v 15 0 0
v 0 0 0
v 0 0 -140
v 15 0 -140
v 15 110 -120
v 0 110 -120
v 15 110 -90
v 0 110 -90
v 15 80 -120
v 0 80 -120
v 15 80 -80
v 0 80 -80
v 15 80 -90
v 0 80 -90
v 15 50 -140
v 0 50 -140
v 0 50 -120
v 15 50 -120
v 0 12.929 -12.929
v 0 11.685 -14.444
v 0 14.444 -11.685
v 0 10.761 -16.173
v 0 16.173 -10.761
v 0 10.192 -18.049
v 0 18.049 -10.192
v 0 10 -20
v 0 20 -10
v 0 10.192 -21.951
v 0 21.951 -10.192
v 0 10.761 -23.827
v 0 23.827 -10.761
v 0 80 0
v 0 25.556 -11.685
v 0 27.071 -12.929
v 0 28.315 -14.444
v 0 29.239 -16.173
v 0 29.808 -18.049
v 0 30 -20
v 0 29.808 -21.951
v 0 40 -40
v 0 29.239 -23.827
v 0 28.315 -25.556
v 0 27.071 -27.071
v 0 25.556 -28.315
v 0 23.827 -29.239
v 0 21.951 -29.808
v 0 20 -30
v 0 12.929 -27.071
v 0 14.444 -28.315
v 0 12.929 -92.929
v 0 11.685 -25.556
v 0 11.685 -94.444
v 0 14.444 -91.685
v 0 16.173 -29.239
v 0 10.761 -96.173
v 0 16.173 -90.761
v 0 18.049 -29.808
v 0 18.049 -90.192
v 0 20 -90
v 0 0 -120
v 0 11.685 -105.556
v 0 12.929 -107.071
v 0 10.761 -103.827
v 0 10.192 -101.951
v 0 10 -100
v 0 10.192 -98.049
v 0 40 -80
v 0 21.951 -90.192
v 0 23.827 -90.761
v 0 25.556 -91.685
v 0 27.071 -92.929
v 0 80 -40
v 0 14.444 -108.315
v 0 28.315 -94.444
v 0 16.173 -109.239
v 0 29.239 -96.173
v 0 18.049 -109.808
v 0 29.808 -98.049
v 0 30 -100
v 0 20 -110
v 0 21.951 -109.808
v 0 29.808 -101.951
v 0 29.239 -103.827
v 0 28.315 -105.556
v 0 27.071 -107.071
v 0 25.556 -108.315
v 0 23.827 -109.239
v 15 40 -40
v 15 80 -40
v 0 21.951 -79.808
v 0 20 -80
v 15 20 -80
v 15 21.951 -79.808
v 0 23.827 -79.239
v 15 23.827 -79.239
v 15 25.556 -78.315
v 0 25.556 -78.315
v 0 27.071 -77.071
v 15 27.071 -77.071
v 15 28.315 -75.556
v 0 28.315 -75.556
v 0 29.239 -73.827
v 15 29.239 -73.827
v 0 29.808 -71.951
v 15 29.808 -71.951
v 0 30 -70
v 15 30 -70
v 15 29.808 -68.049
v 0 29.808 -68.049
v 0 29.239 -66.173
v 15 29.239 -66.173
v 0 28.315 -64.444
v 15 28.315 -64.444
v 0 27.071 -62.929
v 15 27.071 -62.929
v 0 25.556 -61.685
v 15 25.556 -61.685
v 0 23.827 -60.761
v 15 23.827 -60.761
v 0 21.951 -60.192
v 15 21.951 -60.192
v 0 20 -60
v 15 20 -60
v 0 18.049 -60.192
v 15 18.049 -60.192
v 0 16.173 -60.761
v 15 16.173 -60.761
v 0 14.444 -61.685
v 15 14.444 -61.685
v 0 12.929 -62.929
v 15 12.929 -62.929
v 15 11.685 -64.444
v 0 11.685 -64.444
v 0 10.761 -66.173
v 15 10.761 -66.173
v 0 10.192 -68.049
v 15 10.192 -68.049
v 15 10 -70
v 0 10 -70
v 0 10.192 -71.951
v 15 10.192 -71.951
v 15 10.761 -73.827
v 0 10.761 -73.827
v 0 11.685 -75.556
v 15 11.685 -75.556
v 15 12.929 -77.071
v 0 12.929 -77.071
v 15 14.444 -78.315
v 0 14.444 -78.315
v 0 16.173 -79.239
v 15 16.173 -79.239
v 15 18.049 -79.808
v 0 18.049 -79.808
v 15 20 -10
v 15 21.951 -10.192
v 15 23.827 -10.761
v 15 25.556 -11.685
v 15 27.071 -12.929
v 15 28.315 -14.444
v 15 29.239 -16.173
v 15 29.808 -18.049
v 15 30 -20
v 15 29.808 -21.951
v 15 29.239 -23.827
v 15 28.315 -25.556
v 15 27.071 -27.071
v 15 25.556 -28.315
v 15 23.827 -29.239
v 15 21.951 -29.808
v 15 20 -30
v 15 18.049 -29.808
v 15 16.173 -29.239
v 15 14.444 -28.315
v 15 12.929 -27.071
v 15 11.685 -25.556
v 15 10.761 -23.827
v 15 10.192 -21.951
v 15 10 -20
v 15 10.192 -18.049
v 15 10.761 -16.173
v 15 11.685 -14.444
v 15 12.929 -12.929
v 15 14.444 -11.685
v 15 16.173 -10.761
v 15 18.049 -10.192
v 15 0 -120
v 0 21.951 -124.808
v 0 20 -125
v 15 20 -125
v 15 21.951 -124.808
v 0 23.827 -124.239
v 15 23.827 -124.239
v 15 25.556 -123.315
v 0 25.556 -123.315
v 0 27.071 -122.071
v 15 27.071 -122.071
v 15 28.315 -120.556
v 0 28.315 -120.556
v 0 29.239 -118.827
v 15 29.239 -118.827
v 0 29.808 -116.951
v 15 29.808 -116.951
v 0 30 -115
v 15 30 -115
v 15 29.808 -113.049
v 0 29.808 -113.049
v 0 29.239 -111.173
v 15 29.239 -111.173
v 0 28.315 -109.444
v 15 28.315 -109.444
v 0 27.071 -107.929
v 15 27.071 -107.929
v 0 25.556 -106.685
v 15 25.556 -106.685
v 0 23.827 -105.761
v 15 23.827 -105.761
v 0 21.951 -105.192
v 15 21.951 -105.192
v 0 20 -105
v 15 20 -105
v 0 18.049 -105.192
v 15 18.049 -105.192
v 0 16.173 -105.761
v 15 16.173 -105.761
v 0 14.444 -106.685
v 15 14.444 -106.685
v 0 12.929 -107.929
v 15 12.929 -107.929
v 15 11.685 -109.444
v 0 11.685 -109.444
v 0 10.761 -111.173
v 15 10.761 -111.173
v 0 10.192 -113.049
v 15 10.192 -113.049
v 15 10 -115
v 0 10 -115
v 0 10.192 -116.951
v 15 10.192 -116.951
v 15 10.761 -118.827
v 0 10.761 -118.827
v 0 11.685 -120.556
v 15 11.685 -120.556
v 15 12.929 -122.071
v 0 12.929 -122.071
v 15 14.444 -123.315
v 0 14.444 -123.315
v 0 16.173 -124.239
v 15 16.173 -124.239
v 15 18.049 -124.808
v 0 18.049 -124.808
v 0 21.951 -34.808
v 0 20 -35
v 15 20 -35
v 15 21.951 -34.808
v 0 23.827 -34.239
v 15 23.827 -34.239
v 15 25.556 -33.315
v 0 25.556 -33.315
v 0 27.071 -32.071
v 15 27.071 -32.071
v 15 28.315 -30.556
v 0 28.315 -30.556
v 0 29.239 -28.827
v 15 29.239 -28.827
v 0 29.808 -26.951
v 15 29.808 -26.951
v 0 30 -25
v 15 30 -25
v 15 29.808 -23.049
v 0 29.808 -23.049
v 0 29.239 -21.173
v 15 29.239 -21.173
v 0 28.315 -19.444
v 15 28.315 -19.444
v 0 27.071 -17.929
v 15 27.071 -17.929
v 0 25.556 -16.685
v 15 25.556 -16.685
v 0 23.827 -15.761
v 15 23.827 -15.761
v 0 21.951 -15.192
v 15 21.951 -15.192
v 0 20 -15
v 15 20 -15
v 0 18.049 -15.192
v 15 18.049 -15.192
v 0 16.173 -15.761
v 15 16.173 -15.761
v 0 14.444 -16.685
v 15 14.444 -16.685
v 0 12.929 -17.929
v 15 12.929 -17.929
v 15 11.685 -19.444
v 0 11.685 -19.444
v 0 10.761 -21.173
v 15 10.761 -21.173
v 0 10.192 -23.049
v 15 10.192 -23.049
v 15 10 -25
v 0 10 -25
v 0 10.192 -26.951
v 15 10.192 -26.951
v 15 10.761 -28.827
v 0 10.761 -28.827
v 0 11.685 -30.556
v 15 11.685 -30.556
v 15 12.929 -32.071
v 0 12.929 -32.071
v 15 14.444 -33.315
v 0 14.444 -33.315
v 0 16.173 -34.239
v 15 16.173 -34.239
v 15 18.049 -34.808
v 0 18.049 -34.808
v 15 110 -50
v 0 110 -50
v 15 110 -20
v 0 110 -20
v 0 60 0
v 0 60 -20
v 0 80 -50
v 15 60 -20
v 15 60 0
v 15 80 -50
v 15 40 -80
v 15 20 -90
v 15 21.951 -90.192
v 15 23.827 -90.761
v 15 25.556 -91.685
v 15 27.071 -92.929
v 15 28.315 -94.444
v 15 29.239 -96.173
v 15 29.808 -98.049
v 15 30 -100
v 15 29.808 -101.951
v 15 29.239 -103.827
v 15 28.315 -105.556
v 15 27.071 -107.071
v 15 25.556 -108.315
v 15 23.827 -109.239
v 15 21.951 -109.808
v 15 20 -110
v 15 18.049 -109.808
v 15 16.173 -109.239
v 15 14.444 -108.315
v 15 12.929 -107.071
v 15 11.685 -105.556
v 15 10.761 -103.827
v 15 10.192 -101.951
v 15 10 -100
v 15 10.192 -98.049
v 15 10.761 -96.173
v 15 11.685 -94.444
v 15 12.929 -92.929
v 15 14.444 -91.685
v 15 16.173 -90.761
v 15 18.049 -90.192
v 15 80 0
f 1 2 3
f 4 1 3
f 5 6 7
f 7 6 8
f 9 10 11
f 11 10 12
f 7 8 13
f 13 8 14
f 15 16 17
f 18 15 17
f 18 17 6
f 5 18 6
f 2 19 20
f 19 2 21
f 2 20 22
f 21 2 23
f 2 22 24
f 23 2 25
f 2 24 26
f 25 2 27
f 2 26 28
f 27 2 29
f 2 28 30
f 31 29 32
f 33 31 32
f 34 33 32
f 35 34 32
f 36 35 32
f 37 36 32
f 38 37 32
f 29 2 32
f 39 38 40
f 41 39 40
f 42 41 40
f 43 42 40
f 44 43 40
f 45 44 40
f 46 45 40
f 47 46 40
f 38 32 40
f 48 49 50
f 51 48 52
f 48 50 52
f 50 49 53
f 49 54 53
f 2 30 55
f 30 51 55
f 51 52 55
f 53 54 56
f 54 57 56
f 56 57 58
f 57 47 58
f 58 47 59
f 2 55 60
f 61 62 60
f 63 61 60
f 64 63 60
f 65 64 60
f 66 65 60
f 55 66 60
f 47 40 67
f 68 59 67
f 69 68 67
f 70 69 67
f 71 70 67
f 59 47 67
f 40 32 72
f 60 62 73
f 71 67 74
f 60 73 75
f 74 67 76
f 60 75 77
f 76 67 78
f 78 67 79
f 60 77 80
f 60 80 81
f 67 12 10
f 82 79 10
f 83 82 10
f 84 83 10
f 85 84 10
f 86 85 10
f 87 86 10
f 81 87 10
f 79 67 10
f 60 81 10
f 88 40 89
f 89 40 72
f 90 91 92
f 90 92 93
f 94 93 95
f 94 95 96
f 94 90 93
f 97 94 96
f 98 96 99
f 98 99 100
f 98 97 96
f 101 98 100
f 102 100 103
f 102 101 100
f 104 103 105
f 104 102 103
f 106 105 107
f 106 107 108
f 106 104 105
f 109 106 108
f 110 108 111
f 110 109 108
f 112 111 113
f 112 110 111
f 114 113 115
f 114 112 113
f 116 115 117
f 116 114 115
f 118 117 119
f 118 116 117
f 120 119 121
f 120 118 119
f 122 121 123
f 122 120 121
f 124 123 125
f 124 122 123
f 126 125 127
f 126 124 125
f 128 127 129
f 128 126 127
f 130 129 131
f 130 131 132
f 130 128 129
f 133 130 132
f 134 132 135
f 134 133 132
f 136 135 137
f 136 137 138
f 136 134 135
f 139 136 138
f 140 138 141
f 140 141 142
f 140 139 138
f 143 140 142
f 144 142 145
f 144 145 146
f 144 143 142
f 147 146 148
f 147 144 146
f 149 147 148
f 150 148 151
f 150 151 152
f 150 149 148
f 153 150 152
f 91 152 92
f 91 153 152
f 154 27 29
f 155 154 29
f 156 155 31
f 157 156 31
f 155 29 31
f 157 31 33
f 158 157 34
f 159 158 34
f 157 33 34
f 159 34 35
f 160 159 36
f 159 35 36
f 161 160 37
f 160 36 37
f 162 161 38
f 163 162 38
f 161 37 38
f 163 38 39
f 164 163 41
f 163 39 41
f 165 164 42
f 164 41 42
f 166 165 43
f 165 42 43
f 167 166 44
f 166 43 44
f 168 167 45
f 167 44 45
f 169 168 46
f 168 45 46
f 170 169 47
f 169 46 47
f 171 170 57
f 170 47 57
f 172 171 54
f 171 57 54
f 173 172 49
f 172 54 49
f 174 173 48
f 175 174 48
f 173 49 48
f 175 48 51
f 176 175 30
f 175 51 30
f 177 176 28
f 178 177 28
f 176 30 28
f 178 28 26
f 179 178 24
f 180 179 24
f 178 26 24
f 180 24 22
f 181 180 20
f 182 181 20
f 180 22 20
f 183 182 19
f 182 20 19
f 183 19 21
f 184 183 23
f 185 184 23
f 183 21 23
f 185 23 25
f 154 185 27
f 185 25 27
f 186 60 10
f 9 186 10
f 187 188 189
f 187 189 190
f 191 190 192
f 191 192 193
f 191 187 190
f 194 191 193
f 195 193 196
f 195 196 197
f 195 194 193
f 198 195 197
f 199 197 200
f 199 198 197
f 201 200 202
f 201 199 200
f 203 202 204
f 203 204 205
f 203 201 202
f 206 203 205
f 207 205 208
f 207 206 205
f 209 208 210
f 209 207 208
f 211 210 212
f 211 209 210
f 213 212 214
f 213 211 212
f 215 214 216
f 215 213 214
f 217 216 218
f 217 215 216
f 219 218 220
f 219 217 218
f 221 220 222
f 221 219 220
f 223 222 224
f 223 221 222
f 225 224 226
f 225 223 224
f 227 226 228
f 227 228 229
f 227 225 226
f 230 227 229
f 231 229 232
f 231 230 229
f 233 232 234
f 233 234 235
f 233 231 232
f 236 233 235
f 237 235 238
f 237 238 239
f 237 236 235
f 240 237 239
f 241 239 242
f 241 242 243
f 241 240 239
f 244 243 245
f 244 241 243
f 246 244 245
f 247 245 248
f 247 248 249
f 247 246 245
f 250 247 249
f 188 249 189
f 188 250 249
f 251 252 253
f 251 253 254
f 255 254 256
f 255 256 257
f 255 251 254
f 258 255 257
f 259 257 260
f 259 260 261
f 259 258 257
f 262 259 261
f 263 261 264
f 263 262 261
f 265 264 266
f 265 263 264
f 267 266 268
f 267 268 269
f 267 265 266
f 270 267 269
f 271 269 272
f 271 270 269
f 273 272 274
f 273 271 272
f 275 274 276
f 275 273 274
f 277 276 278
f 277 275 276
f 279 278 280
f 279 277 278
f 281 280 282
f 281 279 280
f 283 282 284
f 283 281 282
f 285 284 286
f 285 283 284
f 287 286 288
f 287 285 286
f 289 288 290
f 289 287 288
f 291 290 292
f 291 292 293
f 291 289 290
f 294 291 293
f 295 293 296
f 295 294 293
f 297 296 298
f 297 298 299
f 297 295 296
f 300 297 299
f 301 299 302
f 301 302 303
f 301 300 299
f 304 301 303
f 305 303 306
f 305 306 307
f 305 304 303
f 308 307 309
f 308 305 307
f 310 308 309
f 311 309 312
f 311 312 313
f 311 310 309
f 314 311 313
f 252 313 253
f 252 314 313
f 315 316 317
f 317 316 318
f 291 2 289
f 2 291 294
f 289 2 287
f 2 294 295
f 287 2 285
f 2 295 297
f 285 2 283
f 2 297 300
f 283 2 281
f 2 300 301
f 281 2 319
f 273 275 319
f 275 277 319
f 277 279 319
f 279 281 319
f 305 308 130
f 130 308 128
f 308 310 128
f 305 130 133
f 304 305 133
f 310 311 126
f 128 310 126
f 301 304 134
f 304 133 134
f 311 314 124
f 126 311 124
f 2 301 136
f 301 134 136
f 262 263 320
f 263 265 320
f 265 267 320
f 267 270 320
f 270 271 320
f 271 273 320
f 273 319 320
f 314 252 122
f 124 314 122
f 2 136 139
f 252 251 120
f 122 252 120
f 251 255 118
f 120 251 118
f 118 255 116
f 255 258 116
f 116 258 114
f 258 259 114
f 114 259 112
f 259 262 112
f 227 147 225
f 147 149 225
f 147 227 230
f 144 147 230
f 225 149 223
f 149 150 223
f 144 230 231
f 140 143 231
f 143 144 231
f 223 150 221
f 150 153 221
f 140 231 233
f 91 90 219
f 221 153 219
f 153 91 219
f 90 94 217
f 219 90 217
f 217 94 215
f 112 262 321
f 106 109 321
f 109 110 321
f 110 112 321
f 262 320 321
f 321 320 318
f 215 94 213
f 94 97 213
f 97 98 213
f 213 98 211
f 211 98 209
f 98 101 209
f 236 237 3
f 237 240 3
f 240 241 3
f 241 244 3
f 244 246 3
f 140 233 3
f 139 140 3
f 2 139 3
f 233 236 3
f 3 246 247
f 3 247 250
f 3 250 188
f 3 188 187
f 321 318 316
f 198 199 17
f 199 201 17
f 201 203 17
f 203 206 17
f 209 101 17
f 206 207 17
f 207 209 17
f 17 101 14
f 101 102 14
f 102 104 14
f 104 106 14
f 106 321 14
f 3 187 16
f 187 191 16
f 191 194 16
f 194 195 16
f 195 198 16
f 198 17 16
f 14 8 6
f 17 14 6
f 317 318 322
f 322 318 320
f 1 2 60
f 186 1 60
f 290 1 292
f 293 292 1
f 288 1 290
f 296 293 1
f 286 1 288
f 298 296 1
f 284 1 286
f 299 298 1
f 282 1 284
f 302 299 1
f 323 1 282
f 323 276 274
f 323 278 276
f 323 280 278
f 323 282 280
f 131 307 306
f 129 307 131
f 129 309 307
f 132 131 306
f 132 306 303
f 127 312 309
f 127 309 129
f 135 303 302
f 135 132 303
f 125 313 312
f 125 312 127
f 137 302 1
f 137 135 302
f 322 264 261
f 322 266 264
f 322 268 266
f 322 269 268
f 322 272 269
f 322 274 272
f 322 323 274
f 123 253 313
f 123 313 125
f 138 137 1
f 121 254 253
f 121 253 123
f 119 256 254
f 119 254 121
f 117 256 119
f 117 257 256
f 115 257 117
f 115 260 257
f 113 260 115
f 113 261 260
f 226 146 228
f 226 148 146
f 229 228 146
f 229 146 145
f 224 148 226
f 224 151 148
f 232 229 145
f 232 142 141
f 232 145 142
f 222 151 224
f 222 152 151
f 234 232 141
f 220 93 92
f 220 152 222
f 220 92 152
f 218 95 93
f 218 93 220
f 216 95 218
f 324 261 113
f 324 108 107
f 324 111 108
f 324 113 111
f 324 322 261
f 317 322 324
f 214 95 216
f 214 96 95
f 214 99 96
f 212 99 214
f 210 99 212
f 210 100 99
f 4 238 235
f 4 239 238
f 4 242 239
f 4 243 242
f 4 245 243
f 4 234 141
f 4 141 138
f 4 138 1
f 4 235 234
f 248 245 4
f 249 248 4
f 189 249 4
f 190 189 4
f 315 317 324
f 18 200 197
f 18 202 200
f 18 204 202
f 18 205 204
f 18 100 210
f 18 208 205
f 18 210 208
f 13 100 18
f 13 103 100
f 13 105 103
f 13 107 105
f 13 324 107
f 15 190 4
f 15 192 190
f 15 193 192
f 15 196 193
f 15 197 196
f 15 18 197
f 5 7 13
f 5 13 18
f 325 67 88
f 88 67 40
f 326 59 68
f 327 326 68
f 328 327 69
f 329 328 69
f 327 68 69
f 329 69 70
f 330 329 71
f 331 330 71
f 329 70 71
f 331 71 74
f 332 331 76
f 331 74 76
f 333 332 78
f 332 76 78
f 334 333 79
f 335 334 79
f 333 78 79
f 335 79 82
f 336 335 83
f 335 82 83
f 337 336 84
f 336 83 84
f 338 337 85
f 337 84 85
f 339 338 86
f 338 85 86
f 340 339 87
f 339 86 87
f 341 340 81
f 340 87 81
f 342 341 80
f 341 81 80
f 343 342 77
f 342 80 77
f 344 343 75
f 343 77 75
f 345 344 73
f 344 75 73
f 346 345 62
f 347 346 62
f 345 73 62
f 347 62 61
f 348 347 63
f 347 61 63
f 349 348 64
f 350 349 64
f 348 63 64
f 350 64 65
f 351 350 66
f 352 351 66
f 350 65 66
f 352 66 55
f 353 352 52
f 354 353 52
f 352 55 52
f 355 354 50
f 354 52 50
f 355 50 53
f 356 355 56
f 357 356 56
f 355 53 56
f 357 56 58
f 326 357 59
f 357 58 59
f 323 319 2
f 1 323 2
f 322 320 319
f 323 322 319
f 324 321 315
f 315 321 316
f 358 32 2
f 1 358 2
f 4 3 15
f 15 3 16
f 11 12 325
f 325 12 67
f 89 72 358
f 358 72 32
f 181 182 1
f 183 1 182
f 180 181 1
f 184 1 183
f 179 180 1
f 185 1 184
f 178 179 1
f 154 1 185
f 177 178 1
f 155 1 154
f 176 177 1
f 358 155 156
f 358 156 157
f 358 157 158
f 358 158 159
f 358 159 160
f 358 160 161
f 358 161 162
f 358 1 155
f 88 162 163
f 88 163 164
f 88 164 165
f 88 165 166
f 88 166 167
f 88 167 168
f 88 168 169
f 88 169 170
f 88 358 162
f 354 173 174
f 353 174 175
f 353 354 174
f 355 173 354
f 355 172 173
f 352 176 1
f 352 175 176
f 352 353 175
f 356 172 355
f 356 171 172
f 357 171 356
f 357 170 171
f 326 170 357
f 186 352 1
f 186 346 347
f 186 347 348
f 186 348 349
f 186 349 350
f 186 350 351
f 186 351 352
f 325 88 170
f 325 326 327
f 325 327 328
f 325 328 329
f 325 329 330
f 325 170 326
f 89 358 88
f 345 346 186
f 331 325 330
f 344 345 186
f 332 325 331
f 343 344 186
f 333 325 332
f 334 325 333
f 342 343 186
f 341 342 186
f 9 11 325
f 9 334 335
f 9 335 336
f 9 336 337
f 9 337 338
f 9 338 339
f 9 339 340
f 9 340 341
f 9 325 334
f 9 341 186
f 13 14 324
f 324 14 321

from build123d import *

# Parameters (mm, degrees)
BOSS_EXTRUDE1_DEPTH = 15
SKETCH5_R           = 10
CUT_EXTRUDE1_DEPTH  = 15
SKETCH7_R           = 10
BOSS_EXTRUDE2_DEPTH = 15


with BuildPart() as part:
    # Sketch3 → Boss-Extrude1 (new body)
    with BuildSketch(Plane(origin=(0, 0, 0), x_dir=(0, 0, -1), z_dir=(1, 0, 0))):
        Polygon((0, 0), (120, 0), (120, 80), (80, 80), (80, 40), (40, 40), (40, 80), (0, 80), align=None)
    extrude(amount=BOSS_EXTRUDE1_DEPTH)

    # Sketch5 → Cut-Extrude1 (cut)
    with BuildSketch(Plane.ZY):
        with Locations((-100, 20)):
            Circle(SKETCH5_R)
        with Locations((-20, 20)):
            Circle(SKETCH5_R)
    extrude(amount=-CUT_EXTRUDE1_DEPTH, mode=Mode.SUBTRACT)


with BuildPart() as body_2:
    # Sketch7 → Boss-Extrude2 (new body)
    with BuildSketch(Plane(origin=(0, 0, 0), x_dir=(0, 0, -1), z_dir=(1, 0, 0))):
        Polygon((0, 0), (140, 0), (140, 50), (120, 50), (120, 110), (90, 110), (90, 80), (50, 80), (50, 110), (20, 110), (20, 60), (0, 60), align=None)
        with Locations((25, 20)):
            Circle(SKETCH7_R, mode=Mode.SUBTRACT)
        with Locations((70, 20)):
            Circle(SKETCH7_R, mode=Mode.SUBTRACT)
        with Locations((115, 20)):
            Circle(SKETCH7_R, mode=Mode.SUBTRACT)
    extrude(amount=BOSS_EXTRUDE2_DEPTH)


solid = Compound([part.part, body_2.part])
